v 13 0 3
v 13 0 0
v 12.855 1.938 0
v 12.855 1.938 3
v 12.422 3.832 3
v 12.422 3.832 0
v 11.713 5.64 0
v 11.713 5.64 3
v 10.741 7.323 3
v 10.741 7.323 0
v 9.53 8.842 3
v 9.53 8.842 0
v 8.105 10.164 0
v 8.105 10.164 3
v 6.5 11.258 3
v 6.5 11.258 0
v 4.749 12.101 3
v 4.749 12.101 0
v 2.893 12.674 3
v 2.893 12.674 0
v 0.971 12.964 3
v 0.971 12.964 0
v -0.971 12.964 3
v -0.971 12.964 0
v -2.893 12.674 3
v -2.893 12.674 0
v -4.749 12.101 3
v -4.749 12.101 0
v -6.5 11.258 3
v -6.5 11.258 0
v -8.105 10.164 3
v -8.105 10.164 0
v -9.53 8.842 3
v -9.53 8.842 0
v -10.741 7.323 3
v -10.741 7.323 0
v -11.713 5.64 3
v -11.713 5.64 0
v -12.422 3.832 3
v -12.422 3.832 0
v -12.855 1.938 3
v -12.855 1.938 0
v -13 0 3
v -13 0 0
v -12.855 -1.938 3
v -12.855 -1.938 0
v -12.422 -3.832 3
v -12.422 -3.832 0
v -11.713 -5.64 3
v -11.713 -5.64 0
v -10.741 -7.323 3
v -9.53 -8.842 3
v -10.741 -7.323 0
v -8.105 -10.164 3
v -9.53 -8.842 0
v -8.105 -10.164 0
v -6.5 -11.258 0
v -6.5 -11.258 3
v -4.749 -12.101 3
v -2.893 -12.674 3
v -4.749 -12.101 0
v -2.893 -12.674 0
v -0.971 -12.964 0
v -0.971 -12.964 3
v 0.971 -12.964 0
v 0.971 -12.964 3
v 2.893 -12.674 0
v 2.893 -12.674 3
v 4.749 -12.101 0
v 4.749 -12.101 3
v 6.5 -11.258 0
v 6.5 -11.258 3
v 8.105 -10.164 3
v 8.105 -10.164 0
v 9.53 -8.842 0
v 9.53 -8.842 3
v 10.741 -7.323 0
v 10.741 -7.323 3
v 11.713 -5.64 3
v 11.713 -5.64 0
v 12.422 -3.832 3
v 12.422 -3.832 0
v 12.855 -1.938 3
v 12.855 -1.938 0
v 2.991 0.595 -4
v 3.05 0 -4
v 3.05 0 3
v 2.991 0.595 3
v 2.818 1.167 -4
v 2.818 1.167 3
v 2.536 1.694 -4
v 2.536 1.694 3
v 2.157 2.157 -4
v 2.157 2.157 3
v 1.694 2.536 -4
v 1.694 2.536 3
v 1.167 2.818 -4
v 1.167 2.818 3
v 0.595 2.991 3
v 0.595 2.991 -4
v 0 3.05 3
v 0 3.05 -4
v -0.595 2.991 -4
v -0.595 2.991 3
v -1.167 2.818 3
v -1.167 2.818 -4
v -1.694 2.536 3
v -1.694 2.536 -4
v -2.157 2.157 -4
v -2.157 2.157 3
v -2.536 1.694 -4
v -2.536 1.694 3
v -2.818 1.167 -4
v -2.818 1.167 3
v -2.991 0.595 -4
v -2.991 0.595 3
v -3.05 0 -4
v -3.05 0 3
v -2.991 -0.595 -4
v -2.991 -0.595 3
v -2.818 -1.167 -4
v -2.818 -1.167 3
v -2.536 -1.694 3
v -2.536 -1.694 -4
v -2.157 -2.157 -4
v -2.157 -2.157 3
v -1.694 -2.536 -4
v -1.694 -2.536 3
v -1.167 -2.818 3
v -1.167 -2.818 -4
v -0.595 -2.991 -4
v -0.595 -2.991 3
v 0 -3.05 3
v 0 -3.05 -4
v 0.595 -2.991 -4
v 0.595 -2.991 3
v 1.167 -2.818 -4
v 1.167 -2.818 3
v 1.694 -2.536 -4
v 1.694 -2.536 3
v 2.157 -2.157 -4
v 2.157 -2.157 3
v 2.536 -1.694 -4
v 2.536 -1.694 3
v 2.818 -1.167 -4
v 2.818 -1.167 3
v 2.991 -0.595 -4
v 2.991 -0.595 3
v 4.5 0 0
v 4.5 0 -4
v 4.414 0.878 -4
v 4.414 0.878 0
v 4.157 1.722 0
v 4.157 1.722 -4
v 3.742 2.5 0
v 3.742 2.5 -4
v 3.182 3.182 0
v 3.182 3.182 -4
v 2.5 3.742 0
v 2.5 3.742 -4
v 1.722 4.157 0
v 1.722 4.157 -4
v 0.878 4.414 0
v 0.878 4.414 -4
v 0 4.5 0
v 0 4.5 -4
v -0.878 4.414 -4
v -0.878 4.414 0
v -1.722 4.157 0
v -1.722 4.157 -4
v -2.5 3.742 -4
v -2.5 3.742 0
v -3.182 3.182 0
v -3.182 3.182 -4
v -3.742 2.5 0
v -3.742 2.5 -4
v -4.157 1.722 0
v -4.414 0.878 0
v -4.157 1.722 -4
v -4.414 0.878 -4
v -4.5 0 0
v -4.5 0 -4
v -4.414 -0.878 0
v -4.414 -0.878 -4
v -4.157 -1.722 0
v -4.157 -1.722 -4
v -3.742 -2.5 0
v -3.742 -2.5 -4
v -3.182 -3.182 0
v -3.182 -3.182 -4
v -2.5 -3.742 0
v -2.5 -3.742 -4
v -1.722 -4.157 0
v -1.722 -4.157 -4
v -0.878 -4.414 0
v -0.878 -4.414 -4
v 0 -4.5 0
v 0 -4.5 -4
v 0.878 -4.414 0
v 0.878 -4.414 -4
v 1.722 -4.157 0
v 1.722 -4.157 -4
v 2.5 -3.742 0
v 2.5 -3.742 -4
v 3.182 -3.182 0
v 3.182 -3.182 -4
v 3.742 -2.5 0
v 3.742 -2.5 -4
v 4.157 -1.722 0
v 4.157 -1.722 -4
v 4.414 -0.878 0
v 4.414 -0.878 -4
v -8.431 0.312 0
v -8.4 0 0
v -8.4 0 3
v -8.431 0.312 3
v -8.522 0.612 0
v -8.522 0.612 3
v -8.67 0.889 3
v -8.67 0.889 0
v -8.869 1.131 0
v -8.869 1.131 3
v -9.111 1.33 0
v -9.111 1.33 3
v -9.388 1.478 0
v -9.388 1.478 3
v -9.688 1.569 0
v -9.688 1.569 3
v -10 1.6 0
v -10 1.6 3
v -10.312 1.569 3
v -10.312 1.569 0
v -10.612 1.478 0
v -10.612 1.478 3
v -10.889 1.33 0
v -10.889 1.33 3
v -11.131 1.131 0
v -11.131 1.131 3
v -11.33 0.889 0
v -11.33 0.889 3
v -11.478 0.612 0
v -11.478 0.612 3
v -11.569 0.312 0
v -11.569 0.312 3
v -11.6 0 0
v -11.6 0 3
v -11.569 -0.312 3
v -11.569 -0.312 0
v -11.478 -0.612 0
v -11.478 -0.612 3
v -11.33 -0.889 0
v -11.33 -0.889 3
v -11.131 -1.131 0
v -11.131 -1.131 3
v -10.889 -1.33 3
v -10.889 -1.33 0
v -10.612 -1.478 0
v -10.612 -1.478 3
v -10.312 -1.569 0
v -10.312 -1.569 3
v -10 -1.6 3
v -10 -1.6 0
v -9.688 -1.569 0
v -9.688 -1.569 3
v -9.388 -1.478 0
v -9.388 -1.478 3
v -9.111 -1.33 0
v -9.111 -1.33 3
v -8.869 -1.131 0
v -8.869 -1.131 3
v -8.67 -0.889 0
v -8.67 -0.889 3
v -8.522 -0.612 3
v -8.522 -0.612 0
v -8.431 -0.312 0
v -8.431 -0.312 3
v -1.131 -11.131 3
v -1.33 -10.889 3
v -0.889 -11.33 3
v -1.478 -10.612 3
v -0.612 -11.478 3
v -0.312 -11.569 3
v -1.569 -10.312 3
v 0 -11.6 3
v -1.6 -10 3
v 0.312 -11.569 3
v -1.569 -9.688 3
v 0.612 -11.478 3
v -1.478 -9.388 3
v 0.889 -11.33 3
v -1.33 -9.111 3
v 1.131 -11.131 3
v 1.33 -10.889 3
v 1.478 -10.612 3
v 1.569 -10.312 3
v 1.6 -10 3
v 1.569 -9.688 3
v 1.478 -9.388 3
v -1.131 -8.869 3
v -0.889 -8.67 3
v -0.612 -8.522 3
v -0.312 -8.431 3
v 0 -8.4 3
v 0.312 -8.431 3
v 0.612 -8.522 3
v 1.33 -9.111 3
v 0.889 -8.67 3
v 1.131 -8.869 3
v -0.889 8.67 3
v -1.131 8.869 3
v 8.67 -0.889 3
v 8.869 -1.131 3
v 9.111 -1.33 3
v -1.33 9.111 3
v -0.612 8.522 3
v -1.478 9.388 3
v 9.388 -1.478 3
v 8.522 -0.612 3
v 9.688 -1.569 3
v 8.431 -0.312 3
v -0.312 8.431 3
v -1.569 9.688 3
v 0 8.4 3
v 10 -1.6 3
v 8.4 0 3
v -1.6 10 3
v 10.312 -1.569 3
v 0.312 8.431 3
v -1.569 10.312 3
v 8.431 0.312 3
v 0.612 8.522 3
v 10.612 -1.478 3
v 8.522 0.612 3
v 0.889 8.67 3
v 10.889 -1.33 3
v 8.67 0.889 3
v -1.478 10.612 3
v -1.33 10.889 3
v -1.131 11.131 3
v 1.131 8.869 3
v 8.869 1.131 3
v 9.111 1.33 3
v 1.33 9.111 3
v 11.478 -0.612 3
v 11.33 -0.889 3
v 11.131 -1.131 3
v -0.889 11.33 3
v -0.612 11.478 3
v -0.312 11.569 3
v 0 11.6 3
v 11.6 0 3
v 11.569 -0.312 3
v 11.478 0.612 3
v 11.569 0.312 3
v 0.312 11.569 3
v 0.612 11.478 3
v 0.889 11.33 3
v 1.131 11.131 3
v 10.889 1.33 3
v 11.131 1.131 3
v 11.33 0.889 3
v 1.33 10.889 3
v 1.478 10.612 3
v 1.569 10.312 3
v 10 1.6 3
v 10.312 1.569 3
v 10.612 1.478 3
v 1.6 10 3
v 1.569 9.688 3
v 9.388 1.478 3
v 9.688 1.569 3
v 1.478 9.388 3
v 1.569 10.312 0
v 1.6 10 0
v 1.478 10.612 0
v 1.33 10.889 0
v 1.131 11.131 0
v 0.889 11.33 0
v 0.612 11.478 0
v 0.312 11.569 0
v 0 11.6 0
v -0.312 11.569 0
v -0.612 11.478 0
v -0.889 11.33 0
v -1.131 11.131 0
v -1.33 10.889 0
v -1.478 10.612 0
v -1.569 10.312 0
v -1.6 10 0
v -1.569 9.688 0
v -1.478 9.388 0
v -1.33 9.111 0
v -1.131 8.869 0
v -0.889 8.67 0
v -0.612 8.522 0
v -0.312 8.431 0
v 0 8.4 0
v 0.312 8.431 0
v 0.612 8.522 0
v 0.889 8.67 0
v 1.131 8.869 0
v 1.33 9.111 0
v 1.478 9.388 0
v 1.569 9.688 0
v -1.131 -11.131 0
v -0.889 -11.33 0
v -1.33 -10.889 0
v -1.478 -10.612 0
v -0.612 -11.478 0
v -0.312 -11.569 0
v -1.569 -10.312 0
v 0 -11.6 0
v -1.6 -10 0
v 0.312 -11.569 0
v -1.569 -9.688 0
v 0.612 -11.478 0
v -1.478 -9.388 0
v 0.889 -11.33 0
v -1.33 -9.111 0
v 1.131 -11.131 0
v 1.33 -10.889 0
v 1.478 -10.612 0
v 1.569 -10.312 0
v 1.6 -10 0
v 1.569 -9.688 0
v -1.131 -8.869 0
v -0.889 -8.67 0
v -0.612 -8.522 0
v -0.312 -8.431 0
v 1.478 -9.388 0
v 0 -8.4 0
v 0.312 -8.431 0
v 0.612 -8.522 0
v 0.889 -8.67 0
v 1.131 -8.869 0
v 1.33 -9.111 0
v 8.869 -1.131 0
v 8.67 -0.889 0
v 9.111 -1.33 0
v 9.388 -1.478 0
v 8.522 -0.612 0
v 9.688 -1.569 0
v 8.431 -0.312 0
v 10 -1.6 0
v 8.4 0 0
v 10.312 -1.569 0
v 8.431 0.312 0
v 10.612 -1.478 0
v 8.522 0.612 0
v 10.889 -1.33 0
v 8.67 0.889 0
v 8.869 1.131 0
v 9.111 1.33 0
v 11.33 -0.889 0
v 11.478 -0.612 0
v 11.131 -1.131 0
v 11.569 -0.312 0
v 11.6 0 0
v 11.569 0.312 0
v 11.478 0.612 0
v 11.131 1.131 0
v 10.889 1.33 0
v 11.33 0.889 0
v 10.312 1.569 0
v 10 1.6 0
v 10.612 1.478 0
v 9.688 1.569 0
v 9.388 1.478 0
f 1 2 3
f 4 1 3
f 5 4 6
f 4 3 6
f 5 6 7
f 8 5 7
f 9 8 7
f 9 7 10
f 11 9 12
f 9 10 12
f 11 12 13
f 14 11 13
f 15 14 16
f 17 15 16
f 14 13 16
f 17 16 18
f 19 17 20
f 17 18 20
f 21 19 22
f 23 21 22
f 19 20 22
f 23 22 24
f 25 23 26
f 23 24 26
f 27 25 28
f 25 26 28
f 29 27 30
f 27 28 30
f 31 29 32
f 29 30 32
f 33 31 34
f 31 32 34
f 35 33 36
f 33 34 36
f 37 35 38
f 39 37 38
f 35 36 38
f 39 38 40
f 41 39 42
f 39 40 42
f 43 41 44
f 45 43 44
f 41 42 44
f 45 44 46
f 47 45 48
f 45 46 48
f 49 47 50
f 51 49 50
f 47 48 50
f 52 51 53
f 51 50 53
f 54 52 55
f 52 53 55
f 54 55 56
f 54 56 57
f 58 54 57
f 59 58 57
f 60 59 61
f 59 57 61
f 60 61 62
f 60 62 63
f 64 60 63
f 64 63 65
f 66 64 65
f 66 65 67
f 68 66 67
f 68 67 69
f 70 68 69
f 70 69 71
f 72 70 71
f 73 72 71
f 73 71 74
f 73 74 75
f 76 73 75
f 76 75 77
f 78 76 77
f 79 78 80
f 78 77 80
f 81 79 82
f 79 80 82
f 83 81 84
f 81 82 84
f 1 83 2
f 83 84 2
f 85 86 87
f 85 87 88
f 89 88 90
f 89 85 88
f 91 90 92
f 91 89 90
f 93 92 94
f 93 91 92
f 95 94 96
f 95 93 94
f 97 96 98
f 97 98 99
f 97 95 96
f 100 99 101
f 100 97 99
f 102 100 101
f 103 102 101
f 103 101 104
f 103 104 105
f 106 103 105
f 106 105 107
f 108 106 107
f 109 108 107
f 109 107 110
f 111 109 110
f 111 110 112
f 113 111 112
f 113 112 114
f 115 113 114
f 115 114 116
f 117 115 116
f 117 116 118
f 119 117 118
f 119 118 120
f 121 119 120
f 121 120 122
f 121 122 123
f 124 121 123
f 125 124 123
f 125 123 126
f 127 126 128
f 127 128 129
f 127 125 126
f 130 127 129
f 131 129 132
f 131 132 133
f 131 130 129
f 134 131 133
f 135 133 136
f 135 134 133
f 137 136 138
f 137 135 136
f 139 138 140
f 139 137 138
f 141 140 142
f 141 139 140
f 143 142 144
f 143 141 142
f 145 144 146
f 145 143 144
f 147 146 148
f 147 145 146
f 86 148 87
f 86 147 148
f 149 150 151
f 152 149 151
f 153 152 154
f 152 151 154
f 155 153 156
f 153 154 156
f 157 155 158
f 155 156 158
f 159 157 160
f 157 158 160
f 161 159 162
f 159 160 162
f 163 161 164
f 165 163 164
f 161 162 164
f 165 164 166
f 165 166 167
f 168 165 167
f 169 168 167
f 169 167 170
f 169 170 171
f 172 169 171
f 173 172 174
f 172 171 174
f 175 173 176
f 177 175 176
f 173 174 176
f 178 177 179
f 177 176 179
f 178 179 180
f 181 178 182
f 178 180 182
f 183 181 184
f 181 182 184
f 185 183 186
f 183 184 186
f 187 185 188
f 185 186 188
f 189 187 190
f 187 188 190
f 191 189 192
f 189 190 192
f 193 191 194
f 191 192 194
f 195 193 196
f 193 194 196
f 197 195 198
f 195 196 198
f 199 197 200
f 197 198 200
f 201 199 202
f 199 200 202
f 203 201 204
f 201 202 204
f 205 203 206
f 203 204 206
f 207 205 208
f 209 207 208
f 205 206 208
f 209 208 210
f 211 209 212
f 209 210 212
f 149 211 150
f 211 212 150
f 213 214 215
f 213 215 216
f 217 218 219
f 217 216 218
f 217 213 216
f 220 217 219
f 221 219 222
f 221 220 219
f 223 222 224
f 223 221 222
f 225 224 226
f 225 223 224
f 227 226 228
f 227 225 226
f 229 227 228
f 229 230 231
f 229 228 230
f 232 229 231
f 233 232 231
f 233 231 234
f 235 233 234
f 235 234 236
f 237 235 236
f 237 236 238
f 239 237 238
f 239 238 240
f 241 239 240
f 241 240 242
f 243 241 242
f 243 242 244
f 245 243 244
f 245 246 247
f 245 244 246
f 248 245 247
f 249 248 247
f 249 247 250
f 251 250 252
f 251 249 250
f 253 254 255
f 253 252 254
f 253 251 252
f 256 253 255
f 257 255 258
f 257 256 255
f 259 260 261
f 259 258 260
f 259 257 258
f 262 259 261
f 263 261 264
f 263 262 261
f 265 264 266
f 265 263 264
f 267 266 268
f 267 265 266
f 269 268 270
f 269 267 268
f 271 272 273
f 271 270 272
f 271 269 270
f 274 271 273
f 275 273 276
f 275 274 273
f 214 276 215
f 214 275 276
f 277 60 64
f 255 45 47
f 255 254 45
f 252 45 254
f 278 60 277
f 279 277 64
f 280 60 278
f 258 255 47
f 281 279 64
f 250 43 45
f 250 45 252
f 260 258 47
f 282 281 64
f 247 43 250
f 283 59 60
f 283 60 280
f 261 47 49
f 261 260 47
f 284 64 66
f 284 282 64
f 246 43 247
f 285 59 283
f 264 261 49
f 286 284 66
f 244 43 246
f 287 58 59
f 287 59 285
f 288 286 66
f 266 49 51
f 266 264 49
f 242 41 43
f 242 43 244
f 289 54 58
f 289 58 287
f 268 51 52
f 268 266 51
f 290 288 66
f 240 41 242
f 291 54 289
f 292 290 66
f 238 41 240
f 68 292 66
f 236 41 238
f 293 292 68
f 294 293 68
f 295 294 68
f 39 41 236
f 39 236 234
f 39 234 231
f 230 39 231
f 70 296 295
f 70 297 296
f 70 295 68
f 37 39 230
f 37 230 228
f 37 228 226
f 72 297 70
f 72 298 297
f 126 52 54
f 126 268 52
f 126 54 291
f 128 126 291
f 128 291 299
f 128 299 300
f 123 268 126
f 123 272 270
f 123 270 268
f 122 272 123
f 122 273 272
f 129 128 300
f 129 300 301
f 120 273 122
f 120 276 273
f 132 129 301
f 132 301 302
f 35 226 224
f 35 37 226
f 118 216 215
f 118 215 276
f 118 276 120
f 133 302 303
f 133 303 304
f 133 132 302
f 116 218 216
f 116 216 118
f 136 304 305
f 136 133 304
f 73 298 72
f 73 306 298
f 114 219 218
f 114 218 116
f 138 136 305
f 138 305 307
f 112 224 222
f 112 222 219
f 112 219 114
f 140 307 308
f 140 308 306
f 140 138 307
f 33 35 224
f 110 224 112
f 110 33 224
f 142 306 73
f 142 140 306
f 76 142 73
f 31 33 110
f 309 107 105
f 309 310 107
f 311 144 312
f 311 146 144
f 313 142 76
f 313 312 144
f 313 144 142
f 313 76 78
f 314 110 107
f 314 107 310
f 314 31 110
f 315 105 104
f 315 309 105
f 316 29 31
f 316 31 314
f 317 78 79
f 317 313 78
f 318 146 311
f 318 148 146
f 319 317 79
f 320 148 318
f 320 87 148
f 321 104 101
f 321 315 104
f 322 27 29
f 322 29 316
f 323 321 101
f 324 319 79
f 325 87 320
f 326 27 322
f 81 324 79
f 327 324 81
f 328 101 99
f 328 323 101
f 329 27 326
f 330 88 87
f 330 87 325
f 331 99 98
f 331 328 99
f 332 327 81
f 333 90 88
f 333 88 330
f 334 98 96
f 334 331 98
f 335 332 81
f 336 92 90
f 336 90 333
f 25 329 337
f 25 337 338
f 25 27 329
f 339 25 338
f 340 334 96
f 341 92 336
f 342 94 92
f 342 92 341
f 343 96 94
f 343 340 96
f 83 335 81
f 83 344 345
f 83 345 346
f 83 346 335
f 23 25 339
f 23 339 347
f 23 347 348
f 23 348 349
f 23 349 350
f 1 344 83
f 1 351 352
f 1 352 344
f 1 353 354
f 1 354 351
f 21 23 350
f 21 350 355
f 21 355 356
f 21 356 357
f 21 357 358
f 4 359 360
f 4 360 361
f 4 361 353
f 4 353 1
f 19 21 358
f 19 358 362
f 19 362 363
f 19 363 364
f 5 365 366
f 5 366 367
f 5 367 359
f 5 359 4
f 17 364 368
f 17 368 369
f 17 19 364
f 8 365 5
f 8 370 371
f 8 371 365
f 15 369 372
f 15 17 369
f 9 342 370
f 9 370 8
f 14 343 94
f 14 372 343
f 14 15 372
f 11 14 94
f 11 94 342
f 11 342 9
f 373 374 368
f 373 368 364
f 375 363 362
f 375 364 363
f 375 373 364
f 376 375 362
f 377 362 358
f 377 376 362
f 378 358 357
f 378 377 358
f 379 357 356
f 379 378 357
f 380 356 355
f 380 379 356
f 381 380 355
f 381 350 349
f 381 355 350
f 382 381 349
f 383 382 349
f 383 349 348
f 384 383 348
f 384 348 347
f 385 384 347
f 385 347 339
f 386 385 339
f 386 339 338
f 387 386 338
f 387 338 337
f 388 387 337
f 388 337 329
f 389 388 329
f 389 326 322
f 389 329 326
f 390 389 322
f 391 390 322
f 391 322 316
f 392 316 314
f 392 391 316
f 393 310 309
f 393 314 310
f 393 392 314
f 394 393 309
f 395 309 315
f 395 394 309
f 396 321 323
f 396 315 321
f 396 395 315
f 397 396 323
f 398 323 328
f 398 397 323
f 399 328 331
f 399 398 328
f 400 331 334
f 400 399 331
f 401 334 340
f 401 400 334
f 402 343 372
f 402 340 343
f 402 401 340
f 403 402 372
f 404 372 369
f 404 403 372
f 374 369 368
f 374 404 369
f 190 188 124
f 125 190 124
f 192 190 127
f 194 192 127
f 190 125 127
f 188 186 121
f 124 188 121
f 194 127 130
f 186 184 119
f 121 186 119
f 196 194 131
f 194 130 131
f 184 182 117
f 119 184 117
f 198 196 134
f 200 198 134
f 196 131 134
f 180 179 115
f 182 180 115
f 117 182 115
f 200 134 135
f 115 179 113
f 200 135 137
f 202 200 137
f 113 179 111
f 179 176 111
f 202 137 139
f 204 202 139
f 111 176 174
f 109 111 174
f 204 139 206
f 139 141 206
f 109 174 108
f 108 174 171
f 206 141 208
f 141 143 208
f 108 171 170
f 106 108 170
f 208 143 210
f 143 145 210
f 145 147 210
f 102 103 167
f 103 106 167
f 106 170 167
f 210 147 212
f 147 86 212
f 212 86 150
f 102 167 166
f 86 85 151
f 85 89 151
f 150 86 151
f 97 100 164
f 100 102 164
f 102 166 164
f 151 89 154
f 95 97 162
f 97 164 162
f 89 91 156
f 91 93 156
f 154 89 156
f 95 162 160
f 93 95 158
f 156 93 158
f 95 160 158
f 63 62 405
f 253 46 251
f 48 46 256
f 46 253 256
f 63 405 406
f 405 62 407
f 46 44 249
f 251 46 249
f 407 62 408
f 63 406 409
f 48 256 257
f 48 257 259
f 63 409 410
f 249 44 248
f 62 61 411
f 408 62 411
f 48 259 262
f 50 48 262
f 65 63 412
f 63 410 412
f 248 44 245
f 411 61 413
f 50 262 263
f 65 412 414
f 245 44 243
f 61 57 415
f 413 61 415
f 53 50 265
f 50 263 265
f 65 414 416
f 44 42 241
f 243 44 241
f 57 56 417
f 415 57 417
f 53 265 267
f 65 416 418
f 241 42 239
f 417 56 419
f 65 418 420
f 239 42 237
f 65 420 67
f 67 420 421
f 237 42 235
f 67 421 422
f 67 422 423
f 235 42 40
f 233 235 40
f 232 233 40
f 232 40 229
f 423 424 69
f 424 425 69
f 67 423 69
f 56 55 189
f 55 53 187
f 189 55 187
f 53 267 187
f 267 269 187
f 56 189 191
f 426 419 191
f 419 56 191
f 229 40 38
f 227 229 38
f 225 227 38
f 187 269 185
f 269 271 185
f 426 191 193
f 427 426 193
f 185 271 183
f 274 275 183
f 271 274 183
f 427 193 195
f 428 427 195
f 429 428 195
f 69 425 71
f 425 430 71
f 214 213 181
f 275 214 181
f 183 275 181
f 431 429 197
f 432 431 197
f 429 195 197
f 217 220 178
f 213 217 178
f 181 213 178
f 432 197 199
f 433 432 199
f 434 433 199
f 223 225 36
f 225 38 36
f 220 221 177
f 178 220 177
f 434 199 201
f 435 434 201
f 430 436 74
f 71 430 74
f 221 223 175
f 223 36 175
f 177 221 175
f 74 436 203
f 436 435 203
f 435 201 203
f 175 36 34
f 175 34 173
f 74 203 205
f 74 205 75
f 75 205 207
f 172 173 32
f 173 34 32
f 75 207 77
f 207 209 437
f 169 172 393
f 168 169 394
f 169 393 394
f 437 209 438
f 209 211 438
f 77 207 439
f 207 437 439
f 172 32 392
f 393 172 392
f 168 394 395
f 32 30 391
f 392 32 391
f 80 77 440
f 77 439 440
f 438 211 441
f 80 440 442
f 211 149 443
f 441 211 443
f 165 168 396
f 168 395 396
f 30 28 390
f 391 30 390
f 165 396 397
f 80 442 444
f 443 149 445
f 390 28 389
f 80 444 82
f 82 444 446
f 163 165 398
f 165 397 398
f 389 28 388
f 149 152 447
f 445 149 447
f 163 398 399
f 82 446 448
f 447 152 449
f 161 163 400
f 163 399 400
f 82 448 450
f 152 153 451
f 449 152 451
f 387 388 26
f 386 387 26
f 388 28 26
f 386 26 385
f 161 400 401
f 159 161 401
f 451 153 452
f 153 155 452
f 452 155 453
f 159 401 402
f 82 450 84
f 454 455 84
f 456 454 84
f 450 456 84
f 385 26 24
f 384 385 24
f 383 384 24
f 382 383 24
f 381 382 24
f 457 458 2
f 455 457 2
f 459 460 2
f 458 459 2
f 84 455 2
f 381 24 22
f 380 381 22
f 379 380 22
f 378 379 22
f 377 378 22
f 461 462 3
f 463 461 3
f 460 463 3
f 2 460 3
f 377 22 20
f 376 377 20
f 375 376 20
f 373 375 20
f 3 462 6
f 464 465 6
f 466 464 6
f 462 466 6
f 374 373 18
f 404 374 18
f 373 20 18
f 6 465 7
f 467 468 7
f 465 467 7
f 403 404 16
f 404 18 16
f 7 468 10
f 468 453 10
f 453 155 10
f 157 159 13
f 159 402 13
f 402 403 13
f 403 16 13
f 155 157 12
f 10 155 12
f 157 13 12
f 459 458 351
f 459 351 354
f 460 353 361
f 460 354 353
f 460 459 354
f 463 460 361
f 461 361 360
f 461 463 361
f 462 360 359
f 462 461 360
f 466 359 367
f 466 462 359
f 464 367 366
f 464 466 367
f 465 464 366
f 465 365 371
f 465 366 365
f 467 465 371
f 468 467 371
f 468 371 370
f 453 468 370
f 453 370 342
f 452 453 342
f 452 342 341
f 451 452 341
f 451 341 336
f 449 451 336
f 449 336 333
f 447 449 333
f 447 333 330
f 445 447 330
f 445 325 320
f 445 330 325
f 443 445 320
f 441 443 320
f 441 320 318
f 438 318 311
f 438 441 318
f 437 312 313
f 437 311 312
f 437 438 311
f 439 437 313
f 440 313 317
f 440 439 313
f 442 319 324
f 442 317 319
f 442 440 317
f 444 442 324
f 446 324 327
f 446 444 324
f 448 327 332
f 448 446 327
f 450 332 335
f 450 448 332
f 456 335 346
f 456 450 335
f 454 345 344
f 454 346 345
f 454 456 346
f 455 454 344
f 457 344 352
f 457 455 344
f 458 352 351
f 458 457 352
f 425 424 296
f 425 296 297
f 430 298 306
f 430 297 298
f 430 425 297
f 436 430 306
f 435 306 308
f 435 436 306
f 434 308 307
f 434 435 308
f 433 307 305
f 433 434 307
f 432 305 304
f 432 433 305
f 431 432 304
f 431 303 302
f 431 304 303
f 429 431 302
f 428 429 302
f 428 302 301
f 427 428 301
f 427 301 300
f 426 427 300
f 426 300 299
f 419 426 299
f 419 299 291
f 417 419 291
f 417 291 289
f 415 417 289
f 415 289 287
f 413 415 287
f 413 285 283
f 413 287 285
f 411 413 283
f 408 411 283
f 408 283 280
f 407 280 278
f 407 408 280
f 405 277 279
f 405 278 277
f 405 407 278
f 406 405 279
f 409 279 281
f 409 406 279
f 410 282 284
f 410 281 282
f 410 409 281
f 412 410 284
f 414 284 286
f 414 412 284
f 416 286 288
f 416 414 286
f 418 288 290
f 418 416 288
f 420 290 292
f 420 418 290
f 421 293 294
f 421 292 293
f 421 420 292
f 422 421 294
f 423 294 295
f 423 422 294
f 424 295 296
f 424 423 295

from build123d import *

# Parameters (mm, degrees)
HORN_PLATE_ENVELOPE_PROFILE_R           = 13
HORN_PLATE_ENVELOPE_PROFILE_R_2         = 3.05
HORN_PLATE_ENVELOPE_DEPTH               = 3
SPLINE_HUB_ENVELOPE_START               = -4
SPLINE_HUB_ENVELOPE_PROFILE_R           = 4.5
SPLINE_HUB_ENVELOPE_PROFILE_R_2         = 3.05
SPLINE_HUB_ENVELOPE_DEPTH               = 4
NOMINAL_HORN_ATTACHMENT_HOLES_START     = -50
NOMINAL_HORN_ATTACHMENT_HOLES_PROFILE_R = 1.6
NOMINAL_HORN_ATTACHMENT_HOLES_DEPTH     = 69.814887722


with BuildPart() as part:
    # Horn_plate_envelope_profile → Horn_plate_envelope (new body)
    with BuildSketch(Plane.XY):
        Circle(HORN_PLATE_ENVELOPE_PROFILE_R)
        Circle(HORN_PLATE_ENVELOPE_PROFILE_R_2, mode=Mode.SUBTRACT)
    extrude(amount=HORN_PLATE_ENVELOPE_DEPTH)

    # Spline_hub_envelope_profile → Spline_hub_envelope (add)
    with BuildSketch(Plane.XY.offset(SPLINE_HUB_ENVELOPE_START)):
        Circle(SPLINE_HUB_ENVELOPE_PROFILE_R)
        Circle(SPLINE_HUB_ENVELOPE_PROFILE_R_2, mode=Mode.SUBTRACT)
    extrude(amount=SPLINE_HUB_ENVELOPE_DEPTH)

    # Nominal_horn_attachment_holes_profile → Nominal_horn_attachment_holes (cut, through all)
    with BuildSketch(Plane.XY.offset(NOMINAL_HORN_ATTACHMENT_HOLES_START)):
        with Locations((-10, 0)):
            Circle(NOMINAL_HORN_ATTACHMENT_HOLES_PROFILE_R)
        with Locations((10, 0)):
            Circle(NOMINAL_HORN_ATTACHMENT_HOLES_PROFILE_R)
        with Locations((0, -10)):
            Circle(NOMINAL_HORN_ATTACHMENT_HOLES_PROFILE_R)
        with Locations((0, 10)):
            Circle(NOMINAL_HORN_ATTACHMENT_HOLES_PROFILE_R)
    extrude(amount=NOMINAL_HORN_ATTACHMENT_HOLES_DEPTH, mode=Mode.SUBTRACT)


solid = part.part
